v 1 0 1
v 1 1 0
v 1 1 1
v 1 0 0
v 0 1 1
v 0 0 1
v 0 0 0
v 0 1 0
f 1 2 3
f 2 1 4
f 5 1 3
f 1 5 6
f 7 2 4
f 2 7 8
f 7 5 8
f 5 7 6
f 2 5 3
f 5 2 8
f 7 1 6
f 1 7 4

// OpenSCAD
intersection_for (i = [0:1]) translate([i, 0, 0]) cube();
intersection_for (i = []) cube();
intersection_for (i = [0:0]) cube();
